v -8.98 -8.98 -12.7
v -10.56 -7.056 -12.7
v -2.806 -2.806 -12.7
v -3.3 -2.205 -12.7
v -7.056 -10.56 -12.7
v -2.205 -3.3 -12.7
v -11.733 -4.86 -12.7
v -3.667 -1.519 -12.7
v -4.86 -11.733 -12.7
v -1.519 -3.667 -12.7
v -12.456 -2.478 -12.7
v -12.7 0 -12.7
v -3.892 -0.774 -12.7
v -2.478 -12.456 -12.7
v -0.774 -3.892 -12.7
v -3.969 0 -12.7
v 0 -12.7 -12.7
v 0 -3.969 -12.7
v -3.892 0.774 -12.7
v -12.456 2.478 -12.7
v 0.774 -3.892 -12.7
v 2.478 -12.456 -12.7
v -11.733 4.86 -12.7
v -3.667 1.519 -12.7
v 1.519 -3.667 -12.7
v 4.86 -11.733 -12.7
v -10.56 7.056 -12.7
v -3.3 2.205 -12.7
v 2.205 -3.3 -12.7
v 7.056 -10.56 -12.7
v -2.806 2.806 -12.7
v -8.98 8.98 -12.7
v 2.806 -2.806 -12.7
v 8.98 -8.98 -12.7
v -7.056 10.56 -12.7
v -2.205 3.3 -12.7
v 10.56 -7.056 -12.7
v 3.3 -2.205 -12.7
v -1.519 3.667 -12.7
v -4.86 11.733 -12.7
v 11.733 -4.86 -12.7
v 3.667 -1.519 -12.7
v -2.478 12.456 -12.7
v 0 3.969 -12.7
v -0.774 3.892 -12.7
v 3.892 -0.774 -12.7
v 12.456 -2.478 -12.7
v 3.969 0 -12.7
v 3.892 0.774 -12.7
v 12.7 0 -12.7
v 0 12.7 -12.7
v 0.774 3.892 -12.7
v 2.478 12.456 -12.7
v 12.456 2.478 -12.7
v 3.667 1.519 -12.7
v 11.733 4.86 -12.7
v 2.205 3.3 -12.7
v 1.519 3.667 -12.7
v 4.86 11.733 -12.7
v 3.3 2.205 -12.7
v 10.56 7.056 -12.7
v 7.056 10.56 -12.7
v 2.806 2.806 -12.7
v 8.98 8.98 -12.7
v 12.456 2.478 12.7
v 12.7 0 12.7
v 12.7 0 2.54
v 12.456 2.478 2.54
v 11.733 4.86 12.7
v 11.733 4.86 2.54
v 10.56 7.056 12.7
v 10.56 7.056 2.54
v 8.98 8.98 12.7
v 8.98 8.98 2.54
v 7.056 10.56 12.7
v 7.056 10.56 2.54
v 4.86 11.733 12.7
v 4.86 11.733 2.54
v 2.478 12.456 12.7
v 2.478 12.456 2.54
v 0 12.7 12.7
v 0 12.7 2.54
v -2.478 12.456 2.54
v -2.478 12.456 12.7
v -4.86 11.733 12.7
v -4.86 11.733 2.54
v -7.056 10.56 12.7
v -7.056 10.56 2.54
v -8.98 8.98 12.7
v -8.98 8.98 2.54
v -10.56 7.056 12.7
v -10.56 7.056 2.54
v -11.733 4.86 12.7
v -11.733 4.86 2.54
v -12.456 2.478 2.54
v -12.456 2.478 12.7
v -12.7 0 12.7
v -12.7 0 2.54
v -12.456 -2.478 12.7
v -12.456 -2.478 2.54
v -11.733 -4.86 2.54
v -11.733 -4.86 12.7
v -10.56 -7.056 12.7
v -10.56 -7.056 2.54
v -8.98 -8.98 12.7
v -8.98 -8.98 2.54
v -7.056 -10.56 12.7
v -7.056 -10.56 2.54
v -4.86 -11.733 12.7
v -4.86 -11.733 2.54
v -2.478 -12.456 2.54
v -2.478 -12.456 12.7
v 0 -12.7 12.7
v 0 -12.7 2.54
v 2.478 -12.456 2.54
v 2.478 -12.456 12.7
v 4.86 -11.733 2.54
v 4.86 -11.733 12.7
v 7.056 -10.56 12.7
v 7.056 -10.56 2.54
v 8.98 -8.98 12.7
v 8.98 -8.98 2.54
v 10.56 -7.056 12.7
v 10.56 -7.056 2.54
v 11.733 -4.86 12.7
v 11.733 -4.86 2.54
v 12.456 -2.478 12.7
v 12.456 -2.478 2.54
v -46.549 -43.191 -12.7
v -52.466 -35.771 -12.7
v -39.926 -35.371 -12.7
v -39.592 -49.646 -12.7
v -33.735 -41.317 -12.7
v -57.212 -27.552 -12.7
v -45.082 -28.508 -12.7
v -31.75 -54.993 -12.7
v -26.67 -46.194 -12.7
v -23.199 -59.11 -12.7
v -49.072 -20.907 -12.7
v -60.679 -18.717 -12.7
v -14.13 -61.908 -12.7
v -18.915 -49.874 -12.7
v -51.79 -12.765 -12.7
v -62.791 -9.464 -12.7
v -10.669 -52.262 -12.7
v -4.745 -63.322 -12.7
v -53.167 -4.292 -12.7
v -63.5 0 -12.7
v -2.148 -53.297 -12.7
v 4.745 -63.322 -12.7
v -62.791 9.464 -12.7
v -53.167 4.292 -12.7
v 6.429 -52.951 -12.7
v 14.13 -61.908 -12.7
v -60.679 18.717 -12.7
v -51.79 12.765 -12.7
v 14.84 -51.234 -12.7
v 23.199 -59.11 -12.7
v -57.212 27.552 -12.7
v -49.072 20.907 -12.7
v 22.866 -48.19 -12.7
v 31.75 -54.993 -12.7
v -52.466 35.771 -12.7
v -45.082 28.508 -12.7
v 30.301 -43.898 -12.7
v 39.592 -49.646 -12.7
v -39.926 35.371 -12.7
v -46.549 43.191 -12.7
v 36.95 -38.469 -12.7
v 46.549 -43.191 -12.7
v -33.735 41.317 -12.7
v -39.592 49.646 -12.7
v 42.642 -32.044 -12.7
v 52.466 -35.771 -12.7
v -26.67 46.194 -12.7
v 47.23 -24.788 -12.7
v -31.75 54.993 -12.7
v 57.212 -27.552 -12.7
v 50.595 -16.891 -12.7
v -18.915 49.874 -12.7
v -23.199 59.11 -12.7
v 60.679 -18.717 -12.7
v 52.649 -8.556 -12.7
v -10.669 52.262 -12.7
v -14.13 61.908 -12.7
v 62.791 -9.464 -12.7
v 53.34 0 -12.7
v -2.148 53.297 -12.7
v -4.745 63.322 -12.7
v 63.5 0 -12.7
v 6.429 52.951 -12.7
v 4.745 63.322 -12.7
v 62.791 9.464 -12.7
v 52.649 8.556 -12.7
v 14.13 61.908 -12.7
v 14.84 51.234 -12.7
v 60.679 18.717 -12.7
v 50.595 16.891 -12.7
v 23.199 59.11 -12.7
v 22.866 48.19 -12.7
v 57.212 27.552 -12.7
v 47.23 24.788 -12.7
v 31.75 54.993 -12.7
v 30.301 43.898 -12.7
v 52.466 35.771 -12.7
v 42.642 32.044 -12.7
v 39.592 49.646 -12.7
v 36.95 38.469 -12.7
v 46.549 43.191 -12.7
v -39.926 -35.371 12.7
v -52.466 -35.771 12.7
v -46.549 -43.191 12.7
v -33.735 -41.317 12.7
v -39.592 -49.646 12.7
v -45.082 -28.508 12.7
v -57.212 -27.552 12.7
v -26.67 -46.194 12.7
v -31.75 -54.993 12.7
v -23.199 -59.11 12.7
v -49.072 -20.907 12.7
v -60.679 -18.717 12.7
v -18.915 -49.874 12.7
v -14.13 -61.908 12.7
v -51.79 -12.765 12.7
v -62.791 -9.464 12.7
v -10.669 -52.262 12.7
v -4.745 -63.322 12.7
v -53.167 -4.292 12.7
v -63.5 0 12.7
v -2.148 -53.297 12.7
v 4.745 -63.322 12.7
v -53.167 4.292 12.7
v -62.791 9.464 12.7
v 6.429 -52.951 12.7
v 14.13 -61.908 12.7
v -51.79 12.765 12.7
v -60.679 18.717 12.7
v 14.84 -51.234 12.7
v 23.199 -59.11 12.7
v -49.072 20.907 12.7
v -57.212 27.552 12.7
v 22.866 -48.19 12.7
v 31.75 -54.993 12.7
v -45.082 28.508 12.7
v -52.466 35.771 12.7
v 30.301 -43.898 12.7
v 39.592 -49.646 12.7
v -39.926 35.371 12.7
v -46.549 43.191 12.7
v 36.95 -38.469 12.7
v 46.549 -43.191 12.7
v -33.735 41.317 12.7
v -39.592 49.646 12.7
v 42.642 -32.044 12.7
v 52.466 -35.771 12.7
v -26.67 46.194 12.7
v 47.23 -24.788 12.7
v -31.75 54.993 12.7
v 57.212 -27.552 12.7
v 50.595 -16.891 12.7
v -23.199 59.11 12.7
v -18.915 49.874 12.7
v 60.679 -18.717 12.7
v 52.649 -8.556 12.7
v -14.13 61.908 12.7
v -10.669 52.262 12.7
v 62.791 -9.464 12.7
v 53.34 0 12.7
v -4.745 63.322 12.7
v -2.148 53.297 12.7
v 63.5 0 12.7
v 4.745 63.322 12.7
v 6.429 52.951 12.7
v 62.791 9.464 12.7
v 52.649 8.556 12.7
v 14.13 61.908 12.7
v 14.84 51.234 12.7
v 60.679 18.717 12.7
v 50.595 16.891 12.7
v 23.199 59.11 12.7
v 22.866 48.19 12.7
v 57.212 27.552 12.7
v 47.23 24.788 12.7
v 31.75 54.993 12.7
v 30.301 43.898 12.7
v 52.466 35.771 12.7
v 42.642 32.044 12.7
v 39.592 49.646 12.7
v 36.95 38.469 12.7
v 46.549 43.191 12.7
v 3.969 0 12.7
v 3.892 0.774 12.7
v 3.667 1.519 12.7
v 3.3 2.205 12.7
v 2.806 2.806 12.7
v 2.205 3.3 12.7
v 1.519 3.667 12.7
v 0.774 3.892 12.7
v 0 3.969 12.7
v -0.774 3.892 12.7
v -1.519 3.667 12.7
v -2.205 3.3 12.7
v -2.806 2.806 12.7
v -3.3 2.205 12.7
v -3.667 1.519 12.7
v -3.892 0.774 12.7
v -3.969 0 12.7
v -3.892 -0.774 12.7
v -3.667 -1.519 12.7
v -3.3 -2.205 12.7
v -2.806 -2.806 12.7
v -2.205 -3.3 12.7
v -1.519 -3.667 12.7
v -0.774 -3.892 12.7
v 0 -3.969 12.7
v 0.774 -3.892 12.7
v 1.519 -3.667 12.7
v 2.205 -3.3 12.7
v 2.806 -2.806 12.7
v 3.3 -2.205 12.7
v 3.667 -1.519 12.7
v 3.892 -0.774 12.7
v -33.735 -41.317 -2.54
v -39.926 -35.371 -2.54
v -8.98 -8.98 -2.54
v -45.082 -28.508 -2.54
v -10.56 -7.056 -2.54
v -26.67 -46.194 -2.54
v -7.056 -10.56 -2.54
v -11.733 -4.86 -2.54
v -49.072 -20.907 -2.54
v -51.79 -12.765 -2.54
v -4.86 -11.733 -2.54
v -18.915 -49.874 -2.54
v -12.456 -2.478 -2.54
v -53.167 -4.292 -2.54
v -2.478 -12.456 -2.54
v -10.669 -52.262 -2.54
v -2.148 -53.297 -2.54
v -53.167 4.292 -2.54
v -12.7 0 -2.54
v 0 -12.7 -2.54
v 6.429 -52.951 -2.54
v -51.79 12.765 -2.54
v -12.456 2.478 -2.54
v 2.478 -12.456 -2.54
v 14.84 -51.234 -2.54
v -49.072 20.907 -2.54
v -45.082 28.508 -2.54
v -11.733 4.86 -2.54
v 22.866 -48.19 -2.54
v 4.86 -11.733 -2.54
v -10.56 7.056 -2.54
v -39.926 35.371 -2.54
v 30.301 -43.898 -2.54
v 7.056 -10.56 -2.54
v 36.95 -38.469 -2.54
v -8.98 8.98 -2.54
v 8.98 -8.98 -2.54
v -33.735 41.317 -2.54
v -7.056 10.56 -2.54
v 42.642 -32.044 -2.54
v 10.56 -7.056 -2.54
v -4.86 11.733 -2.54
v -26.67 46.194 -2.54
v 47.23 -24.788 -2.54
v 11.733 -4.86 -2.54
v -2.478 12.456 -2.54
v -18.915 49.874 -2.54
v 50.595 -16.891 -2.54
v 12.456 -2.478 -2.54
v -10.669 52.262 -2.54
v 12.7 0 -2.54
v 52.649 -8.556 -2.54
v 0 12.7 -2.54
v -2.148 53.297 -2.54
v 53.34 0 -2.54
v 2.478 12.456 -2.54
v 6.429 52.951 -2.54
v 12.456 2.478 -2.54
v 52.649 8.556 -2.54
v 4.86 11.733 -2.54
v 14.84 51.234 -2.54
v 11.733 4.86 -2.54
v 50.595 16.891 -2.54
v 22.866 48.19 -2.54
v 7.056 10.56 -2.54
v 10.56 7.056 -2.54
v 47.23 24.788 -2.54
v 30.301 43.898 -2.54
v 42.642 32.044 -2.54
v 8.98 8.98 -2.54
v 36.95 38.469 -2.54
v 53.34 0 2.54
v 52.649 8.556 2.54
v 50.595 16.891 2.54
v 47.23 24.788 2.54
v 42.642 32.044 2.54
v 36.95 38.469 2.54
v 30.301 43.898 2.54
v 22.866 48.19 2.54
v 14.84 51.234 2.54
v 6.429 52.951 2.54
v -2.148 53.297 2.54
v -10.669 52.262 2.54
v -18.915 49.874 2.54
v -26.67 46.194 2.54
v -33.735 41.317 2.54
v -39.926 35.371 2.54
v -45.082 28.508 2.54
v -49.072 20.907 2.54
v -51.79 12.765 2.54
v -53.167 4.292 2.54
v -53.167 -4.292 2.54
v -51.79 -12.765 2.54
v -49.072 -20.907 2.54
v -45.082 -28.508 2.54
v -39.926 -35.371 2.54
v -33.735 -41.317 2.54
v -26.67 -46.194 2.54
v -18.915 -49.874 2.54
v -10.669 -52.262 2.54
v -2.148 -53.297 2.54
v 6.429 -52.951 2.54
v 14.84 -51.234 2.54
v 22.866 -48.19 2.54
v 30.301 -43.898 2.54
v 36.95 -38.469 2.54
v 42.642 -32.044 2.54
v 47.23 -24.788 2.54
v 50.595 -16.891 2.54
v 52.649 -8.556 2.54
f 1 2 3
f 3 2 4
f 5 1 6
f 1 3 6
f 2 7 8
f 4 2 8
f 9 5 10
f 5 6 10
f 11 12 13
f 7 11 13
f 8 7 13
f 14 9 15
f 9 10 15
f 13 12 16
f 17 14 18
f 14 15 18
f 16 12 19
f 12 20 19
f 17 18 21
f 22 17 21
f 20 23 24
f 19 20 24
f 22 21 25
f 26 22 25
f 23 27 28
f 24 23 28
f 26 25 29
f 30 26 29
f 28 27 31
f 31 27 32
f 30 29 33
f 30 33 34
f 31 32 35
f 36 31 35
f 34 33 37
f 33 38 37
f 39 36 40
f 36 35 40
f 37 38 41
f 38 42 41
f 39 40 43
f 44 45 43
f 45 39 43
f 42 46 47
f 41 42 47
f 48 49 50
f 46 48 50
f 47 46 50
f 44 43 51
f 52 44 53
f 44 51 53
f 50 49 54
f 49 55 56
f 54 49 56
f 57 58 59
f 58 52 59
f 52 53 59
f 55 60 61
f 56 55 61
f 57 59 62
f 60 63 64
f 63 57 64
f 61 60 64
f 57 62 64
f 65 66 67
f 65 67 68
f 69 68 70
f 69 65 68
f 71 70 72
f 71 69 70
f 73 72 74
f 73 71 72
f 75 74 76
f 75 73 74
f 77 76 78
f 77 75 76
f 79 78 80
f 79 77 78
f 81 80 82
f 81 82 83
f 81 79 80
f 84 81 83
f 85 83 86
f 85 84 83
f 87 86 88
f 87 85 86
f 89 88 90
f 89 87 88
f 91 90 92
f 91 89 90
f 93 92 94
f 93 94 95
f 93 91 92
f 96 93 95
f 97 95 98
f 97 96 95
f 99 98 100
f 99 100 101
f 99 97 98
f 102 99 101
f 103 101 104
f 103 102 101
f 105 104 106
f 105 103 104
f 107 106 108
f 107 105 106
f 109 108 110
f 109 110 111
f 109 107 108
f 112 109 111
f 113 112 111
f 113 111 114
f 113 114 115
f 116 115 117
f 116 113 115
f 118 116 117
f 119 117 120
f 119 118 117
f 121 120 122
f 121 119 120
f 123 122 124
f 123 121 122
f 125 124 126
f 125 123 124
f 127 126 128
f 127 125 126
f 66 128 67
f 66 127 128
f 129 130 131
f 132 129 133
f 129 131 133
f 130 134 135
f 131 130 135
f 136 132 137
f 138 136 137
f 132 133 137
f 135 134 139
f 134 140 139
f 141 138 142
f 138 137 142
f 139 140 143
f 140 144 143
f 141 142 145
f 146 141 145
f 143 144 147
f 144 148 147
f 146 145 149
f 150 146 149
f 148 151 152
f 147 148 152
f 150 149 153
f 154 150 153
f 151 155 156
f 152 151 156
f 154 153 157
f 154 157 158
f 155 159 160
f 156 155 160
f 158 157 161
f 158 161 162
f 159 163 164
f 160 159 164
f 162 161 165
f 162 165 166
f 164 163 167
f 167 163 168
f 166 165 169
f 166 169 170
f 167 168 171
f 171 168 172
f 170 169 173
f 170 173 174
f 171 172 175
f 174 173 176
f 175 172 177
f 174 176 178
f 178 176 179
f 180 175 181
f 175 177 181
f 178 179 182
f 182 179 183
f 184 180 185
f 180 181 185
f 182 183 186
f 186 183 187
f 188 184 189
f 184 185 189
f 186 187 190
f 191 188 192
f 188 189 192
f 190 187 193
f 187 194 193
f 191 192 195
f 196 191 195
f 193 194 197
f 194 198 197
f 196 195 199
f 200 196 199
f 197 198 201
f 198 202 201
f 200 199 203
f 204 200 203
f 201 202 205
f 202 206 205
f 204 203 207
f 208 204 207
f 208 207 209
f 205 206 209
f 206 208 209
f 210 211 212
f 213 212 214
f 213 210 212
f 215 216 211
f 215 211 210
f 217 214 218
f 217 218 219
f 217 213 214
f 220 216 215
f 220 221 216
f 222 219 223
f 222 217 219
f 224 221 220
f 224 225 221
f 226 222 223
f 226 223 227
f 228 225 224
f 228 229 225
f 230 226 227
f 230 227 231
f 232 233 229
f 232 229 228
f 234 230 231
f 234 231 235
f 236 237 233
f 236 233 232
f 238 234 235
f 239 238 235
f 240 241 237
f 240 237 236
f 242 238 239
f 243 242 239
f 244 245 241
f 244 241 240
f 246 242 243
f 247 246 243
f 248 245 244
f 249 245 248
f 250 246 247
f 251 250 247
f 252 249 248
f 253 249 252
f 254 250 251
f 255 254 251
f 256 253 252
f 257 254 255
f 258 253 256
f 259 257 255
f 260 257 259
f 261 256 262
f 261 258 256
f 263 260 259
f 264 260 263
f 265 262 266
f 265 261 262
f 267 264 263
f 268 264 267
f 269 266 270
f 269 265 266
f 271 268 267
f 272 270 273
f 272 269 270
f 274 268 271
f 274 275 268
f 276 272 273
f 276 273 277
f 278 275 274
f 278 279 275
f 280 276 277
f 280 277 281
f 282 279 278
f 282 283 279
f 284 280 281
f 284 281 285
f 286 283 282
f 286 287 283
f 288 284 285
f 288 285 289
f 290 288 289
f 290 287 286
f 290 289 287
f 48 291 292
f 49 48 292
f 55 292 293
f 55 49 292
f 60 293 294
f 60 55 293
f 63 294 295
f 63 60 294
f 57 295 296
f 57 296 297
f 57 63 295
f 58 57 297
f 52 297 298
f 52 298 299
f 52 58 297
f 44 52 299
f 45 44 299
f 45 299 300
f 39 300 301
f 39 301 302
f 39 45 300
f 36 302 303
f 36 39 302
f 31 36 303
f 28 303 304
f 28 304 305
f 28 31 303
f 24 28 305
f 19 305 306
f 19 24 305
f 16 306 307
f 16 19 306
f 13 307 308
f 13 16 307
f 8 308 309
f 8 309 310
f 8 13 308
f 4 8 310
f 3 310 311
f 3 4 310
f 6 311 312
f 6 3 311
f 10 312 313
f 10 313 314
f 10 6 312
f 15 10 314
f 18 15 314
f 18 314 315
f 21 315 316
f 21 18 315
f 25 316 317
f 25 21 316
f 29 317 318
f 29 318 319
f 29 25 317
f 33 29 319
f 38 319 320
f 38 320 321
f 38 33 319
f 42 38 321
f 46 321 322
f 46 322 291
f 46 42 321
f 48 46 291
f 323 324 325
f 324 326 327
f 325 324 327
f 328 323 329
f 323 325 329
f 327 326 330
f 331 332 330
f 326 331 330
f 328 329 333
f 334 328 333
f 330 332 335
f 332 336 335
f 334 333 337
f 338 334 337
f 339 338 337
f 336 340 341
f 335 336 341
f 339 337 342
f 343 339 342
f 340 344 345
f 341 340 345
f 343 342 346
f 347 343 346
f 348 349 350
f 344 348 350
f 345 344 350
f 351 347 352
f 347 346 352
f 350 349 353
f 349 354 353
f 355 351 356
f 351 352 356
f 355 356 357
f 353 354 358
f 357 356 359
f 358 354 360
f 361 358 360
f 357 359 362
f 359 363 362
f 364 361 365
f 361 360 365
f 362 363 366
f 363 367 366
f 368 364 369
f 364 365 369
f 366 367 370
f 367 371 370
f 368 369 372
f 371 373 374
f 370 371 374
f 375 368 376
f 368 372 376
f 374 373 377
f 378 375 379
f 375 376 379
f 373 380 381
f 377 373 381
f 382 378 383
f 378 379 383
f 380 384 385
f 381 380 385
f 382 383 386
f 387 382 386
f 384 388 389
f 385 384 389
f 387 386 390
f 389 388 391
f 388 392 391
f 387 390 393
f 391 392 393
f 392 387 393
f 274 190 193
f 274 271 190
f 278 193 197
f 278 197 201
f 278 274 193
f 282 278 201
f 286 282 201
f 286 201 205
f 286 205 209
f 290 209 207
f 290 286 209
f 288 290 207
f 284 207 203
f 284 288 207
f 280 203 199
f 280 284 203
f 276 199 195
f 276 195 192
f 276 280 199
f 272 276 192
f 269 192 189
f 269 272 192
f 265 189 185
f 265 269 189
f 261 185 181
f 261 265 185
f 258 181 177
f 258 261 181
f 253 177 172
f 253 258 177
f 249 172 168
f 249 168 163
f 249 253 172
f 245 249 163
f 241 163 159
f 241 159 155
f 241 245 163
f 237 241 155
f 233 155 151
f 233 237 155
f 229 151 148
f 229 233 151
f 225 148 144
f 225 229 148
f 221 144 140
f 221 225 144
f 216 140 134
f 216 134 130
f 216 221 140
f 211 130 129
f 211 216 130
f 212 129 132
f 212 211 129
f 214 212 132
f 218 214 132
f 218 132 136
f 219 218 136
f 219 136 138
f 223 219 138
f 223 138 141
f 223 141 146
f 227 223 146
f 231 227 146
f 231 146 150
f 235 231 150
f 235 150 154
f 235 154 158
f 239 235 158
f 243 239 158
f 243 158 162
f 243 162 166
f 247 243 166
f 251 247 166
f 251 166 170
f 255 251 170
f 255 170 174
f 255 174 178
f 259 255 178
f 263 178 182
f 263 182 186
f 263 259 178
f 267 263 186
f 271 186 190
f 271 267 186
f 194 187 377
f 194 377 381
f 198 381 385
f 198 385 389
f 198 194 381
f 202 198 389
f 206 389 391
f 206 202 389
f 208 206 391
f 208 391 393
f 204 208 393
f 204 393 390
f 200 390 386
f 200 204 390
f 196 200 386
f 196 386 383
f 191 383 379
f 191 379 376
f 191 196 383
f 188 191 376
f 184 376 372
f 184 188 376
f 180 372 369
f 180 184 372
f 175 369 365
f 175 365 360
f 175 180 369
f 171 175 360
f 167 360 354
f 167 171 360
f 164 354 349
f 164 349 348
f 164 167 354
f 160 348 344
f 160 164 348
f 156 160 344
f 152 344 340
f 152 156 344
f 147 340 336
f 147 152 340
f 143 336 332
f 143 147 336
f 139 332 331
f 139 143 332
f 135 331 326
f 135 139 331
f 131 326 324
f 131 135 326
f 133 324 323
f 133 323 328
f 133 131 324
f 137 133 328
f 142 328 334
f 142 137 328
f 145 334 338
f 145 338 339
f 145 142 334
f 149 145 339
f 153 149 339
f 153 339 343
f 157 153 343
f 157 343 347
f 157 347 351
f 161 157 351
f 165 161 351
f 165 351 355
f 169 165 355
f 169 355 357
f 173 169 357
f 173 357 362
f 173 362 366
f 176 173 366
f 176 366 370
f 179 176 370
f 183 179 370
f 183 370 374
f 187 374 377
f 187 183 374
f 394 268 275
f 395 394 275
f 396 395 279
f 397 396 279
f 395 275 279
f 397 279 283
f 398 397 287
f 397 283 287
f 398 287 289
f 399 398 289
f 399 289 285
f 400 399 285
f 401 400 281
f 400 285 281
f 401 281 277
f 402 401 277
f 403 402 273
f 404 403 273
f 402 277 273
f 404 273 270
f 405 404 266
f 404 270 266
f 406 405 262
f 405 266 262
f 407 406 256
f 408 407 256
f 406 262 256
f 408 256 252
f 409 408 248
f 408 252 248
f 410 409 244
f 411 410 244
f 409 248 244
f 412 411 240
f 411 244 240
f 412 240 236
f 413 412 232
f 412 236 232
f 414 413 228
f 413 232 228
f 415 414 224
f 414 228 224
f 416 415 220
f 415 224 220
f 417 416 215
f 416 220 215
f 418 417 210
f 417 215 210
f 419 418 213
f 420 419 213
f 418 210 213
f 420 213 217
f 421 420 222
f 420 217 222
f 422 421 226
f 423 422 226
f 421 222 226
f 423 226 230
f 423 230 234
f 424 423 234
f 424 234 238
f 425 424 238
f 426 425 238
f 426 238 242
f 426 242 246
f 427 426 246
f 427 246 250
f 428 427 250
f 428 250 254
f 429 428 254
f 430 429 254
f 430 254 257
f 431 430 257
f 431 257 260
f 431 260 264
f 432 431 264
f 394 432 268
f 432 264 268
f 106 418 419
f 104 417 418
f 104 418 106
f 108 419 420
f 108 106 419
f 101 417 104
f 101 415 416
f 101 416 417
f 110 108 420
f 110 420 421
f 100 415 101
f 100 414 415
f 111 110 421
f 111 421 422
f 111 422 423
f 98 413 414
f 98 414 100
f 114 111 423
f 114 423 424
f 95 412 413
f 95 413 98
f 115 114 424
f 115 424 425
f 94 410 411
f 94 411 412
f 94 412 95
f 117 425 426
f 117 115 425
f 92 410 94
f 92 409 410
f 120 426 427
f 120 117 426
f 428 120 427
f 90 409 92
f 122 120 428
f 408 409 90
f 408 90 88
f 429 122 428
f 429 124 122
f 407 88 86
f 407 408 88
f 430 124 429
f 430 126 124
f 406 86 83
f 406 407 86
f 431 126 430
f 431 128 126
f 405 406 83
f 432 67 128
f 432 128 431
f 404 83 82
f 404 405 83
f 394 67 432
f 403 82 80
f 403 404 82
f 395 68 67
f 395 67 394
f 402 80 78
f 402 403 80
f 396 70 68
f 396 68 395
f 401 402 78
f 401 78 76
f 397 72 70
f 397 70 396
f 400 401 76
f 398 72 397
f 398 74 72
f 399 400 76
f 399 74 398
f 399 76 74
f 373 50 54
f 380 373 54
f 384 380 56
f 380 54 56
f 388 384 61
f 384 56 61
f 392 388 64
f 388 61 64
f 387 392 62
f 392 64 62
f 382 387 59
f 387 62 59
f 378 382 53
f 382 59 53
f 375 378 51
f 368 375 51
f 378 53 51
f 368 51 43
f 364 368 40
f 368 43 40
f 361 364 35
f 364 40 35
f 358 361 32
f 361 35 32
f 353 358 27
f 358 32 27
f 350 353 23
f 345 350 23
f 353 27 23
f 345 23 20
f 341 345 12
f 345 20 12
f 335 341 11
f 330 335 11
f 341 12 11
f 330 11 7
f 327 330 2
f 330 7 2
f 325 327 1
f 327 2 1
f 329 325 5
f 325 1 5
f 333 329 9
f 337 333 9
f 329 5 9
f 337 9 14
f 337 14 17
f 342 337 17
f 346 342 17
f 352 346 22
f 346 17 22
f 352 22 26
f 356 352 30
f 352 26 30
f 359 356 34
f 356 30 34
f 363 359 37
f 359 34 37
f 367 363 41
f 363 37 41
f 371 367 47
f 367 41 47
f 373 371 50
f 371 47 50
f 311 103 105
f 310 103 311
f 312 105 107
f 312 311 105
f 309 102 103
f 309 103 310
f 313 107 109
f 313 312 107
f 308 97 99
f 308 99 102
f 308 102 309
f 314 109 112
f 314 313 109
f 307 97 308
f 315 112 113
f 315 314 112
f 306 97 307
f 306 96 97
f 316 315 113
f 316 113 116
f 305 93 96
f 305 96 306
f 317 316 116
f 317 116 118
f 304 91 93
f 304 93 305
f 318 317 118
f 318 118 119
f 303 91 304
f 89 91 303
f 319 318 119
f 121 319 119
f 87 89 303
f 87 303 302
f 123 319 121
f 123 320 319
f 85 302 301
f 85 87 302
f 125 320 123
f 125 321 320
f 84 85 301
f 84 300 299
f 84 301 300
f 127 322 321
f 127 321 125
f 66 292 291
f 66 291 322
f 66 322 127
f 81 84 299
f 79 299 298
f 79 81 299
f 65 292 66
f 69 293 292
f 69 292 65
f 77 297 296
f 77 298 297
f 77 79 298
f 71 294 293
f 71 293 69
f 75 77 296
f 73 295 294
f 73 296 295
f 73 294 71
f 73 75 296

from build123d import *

# Parameters (mm, degrees)
SKETCH1_R           = 63.5
SKETCH1_R_2         = 3.96875
BOSS_EXTRUDE1_DEPTH = 12.7
SKETCH2_R           = 53.34
SKETCH2_R_2         = 12.7
CUT_EXTRUDE1_DEPTH  = 10.16


with BuildPart() as part:
    # Sketch1 → Boss-Extrude1 (new body, symmetric)
    with BuildSketch(Plane.XY):
        Circle(SKETCH1_R)
        Circle(SKETCH1_R_2, mode=Mode.SUBTRACT)
    extrude(amount=BOSS_EXTRUDE1_DEPTH, both=True)

    # Sketch2 → Cut-Extrude1 (cut)
    with BuildSketch(Plane.XY.offset(12.7)):
        Circle(SKETCH2_R)
        Circle(SKETCH2_R_2, mode=Mode.SUBTRACT)
    cut_extrude1 = extrude(amount=-CUT_EXTRUDE1_DEPTH, mode=Mode.SUBTRACT)

    # Mirror1: Cut-Extrude1 across plane
    add(cut_extrude1.mirror(Plane.XY), mode=Mode.SUBTRACT)


solid = part.part
